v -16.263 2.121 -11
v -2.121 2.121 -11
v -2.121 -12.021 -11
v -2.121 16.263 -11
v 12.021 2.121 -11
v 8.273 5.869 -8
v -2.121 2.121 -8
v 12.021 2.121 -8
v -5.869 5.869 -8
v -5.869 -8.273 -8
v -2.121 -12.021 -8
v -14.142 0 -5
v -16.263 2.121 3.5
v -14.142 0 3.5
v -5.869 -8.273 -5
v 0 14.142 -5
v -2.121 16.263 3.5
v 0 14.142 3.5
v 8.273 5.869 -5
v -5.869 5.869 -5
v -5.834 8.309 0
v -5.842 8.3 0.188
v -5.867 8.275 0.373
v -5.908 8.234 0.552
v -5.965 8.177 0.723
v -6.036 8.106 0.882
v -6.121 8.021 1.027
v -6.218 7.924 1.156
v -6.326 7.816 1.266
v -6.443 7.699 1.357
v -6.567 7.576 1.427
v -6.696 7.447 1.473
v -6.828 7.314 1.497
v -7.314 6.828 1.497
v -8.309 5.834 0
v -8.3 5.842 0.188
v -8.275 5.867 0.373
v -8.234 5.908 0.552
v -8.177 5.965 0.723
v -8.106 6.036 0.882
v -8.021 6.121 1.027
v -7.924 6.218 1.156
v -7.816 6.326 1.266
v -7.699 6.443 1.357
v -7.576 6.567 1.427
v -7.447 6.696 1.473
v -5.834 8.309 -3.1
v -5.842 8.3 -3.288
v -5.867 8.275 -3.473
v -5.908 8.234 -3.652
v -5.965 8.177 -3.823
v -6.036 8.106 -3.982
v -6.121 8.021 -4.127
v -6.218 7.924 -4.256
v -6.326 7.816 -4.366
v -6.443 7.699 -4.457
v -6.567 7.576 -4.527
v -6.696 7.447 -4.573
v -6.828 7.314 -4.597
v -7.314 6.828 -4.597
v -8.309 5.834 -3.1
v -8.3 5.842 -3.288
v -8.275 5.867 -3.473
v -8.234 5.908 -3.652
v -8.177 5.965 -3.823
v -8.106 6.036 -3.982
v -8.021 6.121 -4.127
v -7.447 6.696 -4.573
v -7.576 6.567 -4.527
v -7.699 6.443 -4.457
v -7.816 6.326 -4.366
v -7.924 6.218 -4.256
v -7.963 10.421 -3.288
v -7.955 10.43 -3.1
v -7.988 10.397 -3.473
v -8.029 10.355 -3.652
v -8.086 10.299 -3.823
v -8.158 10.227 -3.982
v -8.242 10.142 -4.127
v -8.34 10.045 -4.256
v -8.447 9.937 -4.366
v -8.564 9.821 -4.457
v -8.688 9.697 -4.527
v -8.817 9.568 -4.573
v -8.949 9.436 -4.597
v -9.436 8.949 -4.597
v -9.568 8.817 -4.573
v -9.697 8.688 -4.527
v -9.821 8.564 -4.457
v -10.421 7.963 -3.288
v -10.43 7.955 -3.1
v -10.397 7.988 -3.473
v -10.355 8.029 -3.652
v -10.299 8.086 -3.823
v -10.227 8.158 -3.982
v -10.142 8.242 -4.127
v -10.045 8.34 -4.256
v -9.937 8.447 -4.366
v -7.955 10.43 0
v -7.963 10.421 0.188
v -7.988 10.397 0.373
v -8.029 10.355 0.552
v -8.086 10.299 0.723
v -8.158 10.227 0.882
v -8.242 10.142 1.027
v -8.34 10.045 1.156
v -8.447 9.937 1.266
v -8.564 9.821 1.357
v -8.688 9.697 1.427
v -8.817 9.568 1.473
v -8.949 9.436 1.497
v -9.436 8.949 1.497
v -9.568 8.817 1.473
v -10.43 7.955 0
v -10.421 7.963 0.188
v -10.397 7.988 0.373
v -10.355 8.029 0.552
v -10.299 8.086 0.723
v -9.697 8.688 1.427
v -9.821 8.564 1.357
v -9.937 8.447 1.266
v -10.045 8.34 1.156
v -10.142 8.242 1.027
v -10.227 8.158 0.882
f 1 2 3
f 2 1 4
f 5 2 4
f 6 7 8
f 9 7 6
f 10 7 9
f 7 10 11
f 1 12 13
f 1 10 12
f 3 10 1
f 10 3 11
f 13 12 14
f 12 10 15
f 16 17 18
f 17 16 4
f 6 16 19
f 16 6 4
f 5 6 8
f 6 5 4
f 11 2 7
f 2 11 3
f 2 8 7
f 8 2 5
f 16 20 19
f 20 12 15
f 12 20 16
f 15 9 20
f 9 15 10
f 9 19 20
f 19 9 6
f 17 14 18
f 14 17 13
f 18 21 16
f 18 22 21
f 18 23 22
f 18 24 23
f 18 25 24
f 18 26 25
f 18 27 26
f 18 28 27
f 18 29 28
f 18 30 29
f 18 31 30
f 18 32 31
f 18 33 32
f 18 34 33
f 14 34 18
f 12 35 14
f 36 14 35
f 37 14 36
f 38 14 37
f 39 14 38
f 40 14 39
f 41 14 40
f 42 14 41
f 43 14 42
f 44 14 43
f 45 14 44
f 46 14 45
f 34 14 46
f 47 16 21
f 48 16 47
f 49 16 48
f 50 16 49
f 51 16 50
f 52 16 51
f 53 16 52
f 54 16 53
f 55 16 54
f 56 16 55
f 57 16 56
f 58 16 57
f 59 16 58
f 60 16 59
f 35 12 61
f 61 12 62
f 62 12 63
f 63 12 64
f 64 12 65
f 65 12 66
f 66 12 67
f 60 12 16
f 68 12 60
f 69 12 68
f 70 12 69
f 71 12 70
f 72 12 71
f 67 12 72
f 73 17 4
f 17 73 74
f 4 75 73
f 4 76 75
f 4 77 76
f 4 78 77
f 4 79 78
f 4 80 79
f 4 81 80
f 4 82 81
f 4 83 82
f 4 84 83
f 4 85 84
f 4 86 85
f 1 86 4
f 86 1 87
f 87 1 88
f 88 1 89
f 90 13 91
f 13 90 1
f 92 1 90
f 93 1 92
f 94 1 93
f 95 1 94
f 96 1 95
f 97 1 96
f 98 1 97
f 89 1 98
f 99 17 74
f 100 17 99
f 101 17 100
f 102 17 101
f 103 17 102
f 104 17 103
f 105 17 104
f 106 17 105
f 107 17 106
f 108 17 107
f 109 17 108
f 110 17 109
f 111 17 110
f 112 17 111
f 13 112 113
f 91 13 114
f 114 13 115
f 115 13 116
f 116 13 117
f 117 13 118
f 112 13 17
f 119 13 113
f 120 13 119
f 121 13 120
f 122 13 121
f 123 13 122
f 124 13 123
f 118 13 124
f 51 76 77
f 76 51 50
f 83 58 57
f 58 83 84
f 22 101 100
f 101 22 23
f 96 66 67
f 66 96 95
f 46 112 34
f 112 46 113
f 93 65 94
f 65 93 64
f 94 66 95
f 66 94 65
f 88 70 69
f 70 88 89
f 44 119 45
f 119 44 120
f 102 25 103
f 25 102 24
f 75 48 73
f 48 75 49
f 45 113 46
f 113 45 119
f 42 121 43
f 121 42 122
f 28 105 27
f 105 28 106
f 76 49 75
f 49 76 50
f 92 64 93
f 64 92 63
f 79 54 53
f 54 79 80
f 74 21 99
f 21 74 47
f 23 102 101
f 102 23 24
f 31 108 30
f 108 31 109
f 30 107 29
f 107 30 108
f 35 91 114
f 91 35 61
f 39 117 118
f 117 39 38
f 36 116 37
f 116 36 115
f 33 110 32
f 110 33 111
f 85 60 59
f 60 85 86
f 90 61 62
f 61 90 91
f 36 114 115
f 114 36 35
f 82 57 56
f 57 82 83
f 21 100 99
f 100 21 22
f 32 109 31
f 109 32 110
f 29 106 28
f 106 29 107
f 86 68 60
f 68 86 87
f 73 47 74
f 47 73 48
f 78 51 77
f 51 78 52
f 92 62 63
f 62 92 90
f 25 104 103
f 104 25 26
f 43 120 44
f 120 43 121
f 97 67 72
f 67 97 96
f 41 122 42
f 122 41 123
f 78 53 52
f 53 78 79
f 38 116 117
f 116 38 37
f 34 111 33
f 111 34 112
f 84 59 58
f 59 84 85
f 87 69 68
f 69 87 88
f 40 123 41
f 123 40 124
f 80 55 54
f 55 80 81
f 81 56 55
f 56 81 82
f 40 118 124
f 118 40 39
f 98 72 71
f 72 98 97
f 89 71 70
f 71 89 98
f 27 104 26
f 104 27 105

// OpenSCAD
x_size = 23;           // horizontal outer size of the aquarium pedestal. 
y_size = 20;           // 
thickness = 10;         // thickness of the pad bellow aquarium. hairs lenght is 12mm. 
rim_height = 7;        // height of upper rim for fixing the aquarium in position.

mount_hole = 3.7;
clear = 0.175;
axis_offset = -1.5;

// aquarium pad

module bottom () {
    difference () {
        intersection() {
            union(){    // bottom part with rim/fixing pin
                    rotate([0,0,45])
                        translate ([ axis_offset, 0, 0])    
                            cube([x_size, y_size ,thickness], center = true);
                    translate ([sqrt(pow(x_size,2) + pow(x_size,2))/4, sqrt(pow(x_size,2) + pow(x_size,2))/4, thickness/2 + rim_height/2])
                        cube([sqrt(pow(x_size,2) + pow(x_size,2))/2, sqrt(pow(x_size,2) + pow(x_size,2))/2, rim_height], center = true);

                };

            rotate([0,0,45])
                translate ([ axis_offset, 0, 0])
                    cube([x_size, y_size ,4*thickness], center = true); // cut out half of top tip 
        }
        cylinder (h = thickness + rim_height, r= mount_hole, $fn=20);   // hole for screw head    
        translate ([0, 0, -thickness])      // hole for the screw 
            cylinder (h = thickness + rim_height, r= mount_hole/2, $fn=20);
        
        
        rotate([0,0,-45])       // hole for top part mounting nut
            translate ([ 0, -y_size/3, thickness/3])    
                cube([6, 3, thickness], center = true);

        rotate([90,0,-45])      // hole for top part mounting screw.
            translate ([ 0, 1.8, 0])    
                cylinder (h = thickness + rim_height, r= mount_hole/2, $fn=20);

        rotate([0,-45,-45])       // hole for top part mounting nut
            translate ([ 0, 0, -11])    
                cube([30, 30, 1], center = true);

        rotate([0,45,-45])       // hole for top part mounting nut
            translate ([ 0, 0, -11])    
                cube([30, 30, 1], center = true);

        rotate([0,45,45])       // hole for top part mounting nut
            translate ([ 0, 0, -13])    
                cube([30, 30, 1], center = true);

        rotate([0,-45,45])       // hole for top part mounting nut
            translate ([ 0, 0, -11])    
                cube([30, 30, 1], center = true);
    }
}


//Top part
module top () {
    union () {

    wall_thickness = 3;

    rotate([0,0,45])
    translate ([-wall_thickness, 0, 0]) 

        difference () {
            translate ([wall_thickness/2, 0, thickness/2 + 1.5*wall_thickness])    
                    cube([x_size - wall_thickness, y_size , wall_thickness ], center = true);

            rotate([0,0,-45])
                translate ([sqrt(pow(x_size,2) + pow(x_size,2))/4, sqrt(pow(x_size,2) + pow(x_size,2))/4 ,  rim_height])
                    cube([sqrt(pow(x_size,2) + pow(x_size,2))/2, sqrt(pow(x_size,2) + pow(x_size,2))/2, 2*rim_height], center = true);
        };    

    rotate([0,0,45])
    translate ([-8.3, 0, 0]) 

        difference () {
            translate ([8.3/2, 0, thickness/2 + wall_thickness/2])    
                    cube([x_size - 8.3, y_size , wall_thickness ], center = true);

            rotate([0,0,-45])
                translate ([sqrt(pow(x_size,2) + pow(x_size,2))/4, sqrt(pow(x_size,2) + pow(x_size,2))/4 ,  rim_height])
                    cube([sqrt(pow(x_size,2) + pow(x_size,2))/2, sqrt(pow(x_size,2) + pow(x_size,2))/2, rim_height], center = true);
        };      

        
    rotate([0,0,-45])

        difference  () {

            translate ([0, -y_size/2 - wall_thickness/2 , 1.25 * wall_thickness])    
                cube([y_size, wall_thickness , thickness + 1.5*wall_thickness ], center = true);
            
            
                rotate([90,0,0])
                    translate ([-0.5/2, 0, rim_height/3])    
                        minkowski() {
                            cube([0.5,3.1,10]);
                            cylinder(r=1.5,h=1,$fn=50);
                        }
                }


        
    }
}

//translate ([0, 0, thickness])    // separate two parts

//bottom ();

rotate([180,0,0])       // hole for top part mounting nut
top ();
